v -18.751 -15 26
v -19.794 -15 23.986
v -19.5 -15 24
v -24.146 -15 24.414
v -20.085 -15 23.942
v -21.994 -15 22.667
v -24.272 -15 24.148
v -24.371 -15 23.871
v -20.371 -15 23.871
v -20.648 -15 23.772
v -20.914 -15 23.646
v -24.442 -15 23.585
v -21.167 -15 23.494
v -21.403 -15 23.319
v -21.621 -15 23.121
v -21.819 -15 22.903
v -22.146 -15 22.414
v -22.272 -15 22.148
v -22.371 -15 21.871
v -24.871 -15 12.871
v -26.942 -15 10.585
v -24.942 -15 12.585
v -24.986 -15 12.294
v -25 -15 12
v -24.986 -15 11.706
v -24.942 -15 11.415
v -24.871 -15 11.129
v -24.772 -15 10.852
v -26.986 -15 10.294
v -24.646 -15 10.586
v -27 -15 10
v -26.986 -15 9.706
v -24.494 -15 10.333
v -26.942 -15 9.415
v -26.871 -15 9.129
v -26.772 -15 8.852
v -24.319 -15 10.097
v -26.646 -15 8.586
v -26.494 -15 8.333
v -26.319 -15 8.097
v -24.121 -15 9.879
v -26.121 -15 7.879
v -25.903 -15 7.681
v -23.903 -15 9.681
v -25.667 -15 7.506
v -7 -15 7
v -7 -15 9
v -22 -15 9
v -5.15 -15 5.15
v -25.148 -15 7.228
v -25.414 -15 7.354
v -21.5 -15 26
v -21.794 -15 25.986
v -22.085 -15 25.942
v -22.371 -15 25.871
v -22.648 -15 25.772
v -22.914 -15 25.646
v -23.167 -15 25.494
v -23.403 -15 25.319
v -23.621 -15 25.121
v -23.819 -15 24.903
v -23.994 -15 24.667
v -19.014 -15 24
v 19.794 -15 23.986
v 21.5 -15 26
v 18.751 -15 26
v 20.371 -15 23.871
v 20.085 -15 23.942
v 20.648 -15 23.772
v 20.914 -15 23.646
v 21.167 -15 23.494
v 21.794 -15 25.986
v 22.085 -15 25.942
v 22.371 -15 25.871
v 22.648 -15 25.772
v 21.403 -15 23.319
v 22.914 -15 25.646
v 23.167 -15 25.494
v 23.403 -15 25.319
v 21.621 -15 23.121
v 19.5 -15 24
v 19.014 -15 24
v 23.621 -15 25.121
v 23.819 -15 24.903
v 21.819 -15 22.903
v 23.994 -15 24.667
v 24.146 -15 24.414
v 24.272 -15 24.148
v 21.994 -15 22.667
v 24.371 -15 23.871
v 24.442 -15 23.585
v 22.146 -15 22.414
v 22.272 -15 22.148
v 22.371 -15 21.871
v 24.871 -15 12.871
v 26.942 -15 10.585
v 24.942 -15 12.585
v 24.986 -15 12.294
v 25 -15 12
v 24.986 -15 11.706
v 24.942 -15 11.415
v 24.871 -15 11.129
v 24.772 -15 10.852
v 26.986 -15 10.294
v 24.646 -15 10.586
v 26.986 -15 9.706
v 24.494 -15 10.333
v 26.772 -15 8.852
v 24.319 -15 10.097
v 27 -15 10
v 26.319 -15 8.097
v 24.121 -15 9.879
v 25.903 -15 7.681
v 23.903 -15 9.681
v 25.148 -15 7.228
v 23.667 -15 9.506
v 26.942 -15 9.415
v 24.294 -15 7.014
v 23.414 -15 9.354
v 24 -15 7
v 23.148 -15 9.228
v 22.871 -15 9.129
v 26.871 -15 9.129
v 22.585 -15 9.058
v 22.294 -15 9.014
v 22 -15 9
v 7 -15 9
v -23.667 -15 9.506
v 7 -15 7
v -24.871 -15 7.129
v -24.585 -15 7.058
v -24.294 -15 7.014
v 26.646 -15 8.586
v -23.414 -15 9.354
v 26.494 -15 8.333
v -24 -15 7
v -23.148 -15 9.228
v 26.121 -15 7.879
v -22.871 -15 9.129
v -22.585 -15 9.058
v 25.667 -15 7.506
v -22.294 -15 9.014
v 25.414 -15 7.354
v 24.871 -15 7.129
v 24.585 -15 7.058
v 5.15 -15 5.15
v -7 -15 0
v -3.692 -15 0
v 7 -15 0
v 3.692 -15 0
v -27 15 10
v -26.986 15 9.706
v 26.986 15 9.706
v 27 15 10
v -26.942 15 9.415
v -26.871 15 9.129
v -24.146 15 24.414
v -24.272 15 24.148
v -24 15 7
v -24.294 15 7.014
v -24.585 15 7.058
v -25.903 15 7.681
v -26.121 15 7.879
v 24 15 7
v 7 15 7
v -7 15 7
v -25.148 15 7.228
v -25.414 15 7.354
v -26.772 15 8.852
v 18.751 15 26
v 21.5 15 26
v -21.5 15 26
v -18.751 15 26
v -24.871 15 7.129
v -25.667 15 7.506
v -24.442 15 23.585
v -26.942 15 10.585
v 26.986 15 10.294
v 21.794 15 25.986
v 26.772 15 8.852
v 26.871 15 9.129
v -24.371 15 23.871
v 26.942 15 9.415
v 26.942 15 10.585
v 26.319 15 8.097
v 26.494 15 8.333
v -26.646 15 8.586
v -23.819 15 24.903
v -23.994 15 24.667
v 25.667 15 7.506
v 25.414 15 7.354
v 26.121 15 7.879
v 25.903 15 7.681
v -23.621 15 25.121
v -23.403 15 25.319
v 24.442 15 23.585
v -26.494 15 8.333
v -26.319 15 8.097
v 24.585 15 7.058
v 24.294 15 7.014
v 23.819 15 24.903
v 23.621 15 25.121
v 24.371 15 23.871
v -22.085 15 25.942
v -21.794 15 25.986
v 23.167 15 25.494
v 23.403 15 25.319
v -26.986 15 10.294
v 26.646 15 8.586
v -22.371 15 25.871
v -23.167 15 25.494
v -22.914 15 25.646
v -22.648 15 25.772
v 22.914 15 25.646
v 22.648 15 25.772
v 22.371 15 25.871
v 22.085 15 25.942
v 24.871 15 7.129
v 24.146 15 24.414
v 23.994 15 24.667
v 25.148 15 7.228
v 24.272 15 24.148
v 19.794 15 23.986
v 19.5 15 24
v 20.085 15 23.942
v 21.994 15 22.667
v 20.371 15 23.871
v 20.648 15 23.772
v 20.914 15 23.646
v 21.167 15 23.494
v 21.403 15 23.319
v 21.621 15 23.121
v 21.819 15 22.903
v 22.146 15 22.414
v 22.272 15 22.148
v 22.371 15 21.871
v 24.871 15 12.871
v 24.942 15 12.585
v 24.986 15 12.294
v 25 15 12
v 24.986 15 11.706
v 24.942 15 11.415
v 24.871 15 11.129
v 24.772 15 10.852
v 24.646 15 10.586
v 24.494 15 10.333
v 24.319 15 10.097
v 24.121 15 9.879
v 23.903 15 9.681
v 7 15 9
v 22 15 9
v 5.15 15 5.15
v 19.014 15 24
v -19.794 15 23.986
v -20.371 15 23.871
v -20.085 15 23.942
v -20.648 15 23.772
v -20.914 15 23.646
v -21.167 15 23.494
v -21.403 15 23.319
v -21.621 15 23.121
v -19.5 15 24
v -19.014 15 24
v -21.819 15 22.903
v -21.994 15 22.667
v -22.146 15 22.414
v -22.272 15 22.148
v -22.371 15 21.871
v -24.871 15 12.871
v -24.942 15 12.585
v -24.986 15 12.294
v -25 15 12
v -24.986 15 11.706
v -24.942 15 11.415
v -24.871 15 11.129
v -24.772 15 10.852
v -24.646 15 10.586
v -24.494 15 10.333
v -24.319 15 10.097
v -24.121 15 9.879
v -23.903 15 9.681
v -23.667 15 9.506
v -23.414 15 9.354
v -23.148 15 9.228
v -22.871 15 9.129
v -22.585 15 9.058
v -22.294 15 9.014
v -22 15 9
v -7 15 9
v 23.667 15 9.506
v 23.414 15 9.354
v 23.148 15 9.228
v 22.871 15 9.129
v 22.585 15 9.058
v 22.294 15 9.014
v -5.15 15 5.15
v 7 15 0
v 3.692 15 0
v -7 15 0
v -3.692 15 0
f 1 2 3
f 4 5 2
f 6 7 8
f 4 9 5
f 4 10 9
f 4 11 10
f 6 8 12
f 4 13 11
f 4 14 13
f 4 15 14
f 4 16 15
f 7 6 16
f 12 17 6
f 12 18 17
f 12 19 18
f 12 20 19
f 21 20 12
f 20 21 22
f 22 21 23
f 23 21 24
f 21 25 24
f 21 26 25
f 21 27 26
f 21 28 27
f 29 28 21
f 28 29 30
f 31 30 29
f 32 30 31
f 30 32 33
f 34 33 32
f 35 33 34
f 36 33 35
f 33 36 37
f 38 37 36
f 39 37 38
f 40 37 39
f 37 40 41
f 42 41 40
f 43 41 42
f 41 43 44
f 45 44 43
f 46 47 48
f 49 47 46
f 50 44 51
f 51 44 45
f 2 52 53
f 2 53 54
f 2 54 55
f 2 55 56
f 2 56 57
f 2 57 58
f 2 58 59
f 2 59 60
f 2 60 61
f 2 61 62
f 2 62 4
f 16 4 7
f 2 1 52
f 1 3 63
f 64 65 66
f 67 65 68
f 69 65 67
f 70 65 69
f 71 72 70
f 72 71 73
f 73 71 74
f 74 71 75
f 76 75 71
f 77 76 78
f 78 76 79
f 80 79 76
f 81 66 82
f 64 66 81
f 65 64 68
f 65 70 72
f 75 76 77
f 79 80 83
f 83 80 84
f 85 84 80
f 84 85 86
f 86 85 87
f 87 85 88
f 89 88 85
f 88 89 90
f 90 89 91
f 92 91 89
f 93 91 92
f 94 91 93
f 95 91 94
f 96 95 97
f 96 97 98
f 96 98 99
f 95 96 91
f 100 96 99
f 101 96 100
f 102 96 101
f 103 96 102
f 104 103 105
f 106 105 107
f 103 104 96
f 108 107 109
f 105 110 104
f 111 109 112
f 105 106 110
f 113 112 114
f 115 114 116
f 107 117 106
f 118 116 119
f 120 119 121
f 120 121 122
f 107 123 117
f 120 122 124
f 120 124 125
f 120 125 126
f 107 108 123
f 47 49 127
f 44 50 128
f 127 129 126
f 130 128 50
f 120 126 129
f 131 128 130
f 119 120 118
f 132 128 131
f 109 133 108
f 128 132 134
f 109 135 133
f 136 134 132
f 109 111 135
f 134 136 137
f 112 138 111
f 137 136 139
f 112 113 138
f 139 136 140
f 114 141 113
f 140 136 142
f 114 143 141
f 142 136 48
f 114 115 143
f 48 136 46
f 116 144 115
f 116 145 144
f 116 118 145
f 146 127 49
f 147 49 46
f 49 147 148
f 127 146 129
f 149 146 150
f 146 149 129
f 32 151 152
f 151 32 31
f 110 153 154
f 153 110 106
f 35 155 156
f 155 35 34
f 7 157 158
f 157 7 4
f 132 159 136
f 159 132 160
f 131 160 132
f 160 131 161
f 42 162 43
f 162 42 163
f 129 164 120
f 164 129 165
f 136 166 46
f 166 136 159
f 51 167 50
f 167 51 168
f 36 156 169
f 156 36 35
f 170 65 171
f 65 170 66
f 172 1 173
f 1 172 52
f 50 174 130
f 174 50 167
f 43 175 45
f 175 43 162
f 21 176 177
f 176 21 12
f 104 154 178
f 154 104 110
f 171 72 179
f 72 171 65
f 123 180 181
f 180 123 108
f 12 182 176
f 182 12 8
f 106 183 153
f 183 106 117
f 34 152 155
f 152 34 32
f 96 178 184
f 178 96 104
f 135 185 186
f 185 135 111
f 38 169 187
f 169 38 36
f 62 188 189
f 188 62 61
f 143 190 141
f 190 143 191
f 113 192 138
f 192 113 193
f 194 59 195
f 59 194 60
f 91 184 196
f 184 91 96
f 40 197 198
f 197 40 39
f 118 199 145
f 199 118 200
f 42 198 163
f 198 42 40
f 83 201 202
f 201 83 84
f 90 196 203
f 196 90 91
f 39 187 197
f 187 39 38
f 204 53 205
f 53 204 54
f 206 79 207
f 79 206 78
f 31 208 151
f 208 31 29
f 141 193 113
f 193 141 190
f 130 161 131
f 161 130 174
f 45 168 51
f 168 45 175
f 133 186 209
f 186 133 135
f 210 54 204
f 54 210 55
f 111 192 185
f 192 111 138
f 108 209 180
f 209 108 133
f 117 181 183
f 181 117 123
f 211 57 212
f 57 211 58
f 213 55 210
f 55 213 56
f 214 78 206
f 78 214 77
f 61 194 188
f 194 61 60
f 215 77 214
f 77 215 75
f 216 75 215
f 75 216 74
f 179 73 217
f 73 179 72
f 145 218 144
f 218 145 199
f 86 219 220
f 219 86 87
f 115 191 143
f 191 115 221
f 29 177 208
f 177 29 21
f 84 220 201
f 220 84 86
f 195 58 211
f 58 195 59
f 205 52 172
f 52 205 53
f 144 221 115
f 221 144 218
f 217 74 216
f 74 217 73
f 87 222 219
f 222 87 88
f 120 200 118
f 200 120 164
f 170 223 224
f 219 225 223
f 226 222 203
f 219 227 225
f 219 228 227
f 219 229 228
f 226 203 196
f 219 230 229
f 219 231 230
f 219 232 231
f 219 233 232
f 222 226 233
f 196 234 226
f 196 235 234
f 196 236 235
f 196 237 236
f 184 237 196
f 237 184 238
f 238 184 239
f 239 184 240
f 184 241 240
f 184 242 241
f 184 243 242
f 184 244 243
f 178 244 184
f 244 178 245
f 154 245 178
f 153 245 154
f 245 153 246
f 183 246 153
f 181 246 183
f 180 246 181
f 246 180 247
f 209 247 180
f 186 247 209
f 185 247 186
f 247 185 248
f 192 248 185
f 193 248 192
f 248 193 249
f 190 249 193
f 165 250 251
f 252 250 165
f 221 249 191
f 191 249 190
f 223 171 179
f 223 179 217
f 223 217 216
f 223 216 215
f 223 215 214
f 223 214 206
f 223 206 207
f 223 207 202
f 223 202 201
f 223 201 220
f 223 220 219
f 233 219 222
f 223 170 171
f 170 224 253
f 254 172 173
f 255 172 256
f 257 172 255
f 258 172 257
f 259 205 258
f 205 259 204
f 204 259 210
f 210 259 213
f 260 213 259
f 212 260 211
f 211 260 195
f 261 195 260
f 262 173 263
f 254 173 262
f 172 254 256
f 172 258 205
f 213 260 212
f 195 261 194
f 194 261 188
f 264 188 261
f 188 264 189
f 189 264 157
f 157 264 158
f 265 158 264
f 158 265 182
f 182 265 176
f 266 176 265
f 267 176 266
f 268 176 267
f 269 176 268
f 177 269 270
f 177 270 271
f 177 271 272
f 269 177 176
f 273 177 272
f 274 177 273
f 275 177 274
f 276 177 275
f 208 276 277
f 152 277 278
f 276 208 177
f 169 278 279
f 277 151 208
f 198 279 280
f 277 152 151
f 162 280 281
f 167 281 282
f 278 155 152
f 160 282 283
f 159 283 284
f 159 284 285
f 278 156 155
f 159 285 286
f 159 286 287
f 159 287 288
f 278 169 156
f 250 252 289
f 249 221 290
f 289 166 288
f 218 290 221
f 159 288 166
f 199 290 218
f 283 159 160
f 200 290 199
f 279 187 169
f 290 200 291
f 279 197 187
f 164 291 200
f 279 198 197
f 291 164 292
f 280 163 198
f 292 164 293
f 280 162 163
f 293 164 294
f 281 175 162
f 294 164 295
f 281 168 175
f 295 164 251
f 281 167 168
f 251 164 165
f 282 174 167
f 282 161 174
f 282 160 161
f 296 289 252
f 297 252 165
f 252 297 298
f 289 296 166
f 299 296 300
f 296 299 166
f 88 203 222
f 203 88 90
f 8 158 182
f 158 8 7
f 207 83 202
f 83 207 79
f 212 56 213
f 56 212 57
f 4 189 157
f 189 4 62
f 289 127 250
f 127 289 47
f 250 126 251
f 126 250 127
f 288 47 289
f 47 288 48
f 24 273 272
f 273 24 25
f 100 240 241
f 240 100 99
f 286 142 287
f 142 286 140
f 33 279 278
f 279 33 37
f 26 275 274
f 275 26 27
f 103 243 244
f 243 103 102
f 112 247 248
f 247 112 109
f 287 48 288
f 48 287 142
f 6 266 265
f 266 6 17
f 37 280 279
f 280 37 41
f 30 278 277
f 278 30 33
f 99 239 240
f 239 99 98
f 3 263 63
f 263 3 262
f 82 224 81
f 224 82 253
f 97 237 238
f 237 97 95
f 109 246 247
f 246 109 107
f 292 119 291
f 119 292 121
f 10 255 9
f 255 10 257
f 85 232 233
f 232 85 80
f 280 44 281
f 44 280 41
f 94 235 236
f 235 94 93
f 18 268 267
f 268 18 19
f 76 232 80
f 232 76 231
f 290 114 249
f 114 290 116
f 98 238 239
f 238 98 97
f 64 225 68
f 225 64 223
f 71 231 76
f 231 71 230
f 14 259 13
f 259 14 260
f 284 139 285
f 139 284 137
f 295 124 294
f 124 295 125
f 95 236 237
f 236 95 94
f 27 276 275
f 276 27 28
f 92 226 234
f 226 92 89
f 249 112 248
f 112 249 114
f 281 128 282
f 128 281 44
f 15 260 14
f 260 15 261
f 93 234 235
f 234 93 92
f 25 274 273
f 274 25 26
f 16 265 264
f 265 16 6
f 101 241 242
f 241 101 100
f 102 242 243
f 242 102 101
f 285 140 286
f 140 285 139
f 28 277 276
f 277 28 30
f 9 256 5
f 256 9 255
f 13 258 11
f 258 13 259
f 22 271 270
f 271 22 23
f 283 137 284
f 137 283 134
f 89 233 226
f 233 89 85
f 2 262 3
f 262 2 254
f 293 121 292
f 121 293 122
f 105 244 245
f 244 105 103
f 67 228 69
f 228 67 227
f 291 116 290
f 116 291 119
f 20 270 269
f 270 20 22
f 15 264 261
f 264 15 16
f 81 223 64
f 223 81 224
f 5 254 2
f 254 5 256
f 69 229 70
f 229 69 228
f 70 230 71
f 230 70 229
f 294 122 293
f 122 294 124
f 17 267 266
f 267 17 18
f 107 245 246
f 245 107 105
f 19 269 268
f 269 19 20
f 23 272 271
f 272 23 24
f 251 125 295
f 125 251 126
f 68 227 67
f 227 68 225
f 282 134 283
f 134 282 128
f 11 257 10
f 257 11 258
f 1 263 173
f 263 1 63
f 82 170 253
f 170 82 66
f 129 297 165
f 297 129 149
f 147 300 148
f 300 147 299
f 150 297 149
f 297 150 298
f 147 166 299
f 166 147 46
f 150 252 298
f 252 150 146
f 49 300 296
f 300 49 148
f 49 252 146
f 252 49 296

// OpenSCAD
// =====================================
// Toothpaste Clip Piece
// Clip + arm + dovetail channel
// Print with dovetail channel face down on bed
// =====================================

include <_toothbrush_holder.scad>

// Dovetail back face at Z = grip_outer_x - plate_thickness = 30
// Rotate so back face is down, then shift to bed
rotate([180, 0, 0])
translate([0, 0, -(grip_outer_x - plate_thickness)])
    paste_clip_piece();
